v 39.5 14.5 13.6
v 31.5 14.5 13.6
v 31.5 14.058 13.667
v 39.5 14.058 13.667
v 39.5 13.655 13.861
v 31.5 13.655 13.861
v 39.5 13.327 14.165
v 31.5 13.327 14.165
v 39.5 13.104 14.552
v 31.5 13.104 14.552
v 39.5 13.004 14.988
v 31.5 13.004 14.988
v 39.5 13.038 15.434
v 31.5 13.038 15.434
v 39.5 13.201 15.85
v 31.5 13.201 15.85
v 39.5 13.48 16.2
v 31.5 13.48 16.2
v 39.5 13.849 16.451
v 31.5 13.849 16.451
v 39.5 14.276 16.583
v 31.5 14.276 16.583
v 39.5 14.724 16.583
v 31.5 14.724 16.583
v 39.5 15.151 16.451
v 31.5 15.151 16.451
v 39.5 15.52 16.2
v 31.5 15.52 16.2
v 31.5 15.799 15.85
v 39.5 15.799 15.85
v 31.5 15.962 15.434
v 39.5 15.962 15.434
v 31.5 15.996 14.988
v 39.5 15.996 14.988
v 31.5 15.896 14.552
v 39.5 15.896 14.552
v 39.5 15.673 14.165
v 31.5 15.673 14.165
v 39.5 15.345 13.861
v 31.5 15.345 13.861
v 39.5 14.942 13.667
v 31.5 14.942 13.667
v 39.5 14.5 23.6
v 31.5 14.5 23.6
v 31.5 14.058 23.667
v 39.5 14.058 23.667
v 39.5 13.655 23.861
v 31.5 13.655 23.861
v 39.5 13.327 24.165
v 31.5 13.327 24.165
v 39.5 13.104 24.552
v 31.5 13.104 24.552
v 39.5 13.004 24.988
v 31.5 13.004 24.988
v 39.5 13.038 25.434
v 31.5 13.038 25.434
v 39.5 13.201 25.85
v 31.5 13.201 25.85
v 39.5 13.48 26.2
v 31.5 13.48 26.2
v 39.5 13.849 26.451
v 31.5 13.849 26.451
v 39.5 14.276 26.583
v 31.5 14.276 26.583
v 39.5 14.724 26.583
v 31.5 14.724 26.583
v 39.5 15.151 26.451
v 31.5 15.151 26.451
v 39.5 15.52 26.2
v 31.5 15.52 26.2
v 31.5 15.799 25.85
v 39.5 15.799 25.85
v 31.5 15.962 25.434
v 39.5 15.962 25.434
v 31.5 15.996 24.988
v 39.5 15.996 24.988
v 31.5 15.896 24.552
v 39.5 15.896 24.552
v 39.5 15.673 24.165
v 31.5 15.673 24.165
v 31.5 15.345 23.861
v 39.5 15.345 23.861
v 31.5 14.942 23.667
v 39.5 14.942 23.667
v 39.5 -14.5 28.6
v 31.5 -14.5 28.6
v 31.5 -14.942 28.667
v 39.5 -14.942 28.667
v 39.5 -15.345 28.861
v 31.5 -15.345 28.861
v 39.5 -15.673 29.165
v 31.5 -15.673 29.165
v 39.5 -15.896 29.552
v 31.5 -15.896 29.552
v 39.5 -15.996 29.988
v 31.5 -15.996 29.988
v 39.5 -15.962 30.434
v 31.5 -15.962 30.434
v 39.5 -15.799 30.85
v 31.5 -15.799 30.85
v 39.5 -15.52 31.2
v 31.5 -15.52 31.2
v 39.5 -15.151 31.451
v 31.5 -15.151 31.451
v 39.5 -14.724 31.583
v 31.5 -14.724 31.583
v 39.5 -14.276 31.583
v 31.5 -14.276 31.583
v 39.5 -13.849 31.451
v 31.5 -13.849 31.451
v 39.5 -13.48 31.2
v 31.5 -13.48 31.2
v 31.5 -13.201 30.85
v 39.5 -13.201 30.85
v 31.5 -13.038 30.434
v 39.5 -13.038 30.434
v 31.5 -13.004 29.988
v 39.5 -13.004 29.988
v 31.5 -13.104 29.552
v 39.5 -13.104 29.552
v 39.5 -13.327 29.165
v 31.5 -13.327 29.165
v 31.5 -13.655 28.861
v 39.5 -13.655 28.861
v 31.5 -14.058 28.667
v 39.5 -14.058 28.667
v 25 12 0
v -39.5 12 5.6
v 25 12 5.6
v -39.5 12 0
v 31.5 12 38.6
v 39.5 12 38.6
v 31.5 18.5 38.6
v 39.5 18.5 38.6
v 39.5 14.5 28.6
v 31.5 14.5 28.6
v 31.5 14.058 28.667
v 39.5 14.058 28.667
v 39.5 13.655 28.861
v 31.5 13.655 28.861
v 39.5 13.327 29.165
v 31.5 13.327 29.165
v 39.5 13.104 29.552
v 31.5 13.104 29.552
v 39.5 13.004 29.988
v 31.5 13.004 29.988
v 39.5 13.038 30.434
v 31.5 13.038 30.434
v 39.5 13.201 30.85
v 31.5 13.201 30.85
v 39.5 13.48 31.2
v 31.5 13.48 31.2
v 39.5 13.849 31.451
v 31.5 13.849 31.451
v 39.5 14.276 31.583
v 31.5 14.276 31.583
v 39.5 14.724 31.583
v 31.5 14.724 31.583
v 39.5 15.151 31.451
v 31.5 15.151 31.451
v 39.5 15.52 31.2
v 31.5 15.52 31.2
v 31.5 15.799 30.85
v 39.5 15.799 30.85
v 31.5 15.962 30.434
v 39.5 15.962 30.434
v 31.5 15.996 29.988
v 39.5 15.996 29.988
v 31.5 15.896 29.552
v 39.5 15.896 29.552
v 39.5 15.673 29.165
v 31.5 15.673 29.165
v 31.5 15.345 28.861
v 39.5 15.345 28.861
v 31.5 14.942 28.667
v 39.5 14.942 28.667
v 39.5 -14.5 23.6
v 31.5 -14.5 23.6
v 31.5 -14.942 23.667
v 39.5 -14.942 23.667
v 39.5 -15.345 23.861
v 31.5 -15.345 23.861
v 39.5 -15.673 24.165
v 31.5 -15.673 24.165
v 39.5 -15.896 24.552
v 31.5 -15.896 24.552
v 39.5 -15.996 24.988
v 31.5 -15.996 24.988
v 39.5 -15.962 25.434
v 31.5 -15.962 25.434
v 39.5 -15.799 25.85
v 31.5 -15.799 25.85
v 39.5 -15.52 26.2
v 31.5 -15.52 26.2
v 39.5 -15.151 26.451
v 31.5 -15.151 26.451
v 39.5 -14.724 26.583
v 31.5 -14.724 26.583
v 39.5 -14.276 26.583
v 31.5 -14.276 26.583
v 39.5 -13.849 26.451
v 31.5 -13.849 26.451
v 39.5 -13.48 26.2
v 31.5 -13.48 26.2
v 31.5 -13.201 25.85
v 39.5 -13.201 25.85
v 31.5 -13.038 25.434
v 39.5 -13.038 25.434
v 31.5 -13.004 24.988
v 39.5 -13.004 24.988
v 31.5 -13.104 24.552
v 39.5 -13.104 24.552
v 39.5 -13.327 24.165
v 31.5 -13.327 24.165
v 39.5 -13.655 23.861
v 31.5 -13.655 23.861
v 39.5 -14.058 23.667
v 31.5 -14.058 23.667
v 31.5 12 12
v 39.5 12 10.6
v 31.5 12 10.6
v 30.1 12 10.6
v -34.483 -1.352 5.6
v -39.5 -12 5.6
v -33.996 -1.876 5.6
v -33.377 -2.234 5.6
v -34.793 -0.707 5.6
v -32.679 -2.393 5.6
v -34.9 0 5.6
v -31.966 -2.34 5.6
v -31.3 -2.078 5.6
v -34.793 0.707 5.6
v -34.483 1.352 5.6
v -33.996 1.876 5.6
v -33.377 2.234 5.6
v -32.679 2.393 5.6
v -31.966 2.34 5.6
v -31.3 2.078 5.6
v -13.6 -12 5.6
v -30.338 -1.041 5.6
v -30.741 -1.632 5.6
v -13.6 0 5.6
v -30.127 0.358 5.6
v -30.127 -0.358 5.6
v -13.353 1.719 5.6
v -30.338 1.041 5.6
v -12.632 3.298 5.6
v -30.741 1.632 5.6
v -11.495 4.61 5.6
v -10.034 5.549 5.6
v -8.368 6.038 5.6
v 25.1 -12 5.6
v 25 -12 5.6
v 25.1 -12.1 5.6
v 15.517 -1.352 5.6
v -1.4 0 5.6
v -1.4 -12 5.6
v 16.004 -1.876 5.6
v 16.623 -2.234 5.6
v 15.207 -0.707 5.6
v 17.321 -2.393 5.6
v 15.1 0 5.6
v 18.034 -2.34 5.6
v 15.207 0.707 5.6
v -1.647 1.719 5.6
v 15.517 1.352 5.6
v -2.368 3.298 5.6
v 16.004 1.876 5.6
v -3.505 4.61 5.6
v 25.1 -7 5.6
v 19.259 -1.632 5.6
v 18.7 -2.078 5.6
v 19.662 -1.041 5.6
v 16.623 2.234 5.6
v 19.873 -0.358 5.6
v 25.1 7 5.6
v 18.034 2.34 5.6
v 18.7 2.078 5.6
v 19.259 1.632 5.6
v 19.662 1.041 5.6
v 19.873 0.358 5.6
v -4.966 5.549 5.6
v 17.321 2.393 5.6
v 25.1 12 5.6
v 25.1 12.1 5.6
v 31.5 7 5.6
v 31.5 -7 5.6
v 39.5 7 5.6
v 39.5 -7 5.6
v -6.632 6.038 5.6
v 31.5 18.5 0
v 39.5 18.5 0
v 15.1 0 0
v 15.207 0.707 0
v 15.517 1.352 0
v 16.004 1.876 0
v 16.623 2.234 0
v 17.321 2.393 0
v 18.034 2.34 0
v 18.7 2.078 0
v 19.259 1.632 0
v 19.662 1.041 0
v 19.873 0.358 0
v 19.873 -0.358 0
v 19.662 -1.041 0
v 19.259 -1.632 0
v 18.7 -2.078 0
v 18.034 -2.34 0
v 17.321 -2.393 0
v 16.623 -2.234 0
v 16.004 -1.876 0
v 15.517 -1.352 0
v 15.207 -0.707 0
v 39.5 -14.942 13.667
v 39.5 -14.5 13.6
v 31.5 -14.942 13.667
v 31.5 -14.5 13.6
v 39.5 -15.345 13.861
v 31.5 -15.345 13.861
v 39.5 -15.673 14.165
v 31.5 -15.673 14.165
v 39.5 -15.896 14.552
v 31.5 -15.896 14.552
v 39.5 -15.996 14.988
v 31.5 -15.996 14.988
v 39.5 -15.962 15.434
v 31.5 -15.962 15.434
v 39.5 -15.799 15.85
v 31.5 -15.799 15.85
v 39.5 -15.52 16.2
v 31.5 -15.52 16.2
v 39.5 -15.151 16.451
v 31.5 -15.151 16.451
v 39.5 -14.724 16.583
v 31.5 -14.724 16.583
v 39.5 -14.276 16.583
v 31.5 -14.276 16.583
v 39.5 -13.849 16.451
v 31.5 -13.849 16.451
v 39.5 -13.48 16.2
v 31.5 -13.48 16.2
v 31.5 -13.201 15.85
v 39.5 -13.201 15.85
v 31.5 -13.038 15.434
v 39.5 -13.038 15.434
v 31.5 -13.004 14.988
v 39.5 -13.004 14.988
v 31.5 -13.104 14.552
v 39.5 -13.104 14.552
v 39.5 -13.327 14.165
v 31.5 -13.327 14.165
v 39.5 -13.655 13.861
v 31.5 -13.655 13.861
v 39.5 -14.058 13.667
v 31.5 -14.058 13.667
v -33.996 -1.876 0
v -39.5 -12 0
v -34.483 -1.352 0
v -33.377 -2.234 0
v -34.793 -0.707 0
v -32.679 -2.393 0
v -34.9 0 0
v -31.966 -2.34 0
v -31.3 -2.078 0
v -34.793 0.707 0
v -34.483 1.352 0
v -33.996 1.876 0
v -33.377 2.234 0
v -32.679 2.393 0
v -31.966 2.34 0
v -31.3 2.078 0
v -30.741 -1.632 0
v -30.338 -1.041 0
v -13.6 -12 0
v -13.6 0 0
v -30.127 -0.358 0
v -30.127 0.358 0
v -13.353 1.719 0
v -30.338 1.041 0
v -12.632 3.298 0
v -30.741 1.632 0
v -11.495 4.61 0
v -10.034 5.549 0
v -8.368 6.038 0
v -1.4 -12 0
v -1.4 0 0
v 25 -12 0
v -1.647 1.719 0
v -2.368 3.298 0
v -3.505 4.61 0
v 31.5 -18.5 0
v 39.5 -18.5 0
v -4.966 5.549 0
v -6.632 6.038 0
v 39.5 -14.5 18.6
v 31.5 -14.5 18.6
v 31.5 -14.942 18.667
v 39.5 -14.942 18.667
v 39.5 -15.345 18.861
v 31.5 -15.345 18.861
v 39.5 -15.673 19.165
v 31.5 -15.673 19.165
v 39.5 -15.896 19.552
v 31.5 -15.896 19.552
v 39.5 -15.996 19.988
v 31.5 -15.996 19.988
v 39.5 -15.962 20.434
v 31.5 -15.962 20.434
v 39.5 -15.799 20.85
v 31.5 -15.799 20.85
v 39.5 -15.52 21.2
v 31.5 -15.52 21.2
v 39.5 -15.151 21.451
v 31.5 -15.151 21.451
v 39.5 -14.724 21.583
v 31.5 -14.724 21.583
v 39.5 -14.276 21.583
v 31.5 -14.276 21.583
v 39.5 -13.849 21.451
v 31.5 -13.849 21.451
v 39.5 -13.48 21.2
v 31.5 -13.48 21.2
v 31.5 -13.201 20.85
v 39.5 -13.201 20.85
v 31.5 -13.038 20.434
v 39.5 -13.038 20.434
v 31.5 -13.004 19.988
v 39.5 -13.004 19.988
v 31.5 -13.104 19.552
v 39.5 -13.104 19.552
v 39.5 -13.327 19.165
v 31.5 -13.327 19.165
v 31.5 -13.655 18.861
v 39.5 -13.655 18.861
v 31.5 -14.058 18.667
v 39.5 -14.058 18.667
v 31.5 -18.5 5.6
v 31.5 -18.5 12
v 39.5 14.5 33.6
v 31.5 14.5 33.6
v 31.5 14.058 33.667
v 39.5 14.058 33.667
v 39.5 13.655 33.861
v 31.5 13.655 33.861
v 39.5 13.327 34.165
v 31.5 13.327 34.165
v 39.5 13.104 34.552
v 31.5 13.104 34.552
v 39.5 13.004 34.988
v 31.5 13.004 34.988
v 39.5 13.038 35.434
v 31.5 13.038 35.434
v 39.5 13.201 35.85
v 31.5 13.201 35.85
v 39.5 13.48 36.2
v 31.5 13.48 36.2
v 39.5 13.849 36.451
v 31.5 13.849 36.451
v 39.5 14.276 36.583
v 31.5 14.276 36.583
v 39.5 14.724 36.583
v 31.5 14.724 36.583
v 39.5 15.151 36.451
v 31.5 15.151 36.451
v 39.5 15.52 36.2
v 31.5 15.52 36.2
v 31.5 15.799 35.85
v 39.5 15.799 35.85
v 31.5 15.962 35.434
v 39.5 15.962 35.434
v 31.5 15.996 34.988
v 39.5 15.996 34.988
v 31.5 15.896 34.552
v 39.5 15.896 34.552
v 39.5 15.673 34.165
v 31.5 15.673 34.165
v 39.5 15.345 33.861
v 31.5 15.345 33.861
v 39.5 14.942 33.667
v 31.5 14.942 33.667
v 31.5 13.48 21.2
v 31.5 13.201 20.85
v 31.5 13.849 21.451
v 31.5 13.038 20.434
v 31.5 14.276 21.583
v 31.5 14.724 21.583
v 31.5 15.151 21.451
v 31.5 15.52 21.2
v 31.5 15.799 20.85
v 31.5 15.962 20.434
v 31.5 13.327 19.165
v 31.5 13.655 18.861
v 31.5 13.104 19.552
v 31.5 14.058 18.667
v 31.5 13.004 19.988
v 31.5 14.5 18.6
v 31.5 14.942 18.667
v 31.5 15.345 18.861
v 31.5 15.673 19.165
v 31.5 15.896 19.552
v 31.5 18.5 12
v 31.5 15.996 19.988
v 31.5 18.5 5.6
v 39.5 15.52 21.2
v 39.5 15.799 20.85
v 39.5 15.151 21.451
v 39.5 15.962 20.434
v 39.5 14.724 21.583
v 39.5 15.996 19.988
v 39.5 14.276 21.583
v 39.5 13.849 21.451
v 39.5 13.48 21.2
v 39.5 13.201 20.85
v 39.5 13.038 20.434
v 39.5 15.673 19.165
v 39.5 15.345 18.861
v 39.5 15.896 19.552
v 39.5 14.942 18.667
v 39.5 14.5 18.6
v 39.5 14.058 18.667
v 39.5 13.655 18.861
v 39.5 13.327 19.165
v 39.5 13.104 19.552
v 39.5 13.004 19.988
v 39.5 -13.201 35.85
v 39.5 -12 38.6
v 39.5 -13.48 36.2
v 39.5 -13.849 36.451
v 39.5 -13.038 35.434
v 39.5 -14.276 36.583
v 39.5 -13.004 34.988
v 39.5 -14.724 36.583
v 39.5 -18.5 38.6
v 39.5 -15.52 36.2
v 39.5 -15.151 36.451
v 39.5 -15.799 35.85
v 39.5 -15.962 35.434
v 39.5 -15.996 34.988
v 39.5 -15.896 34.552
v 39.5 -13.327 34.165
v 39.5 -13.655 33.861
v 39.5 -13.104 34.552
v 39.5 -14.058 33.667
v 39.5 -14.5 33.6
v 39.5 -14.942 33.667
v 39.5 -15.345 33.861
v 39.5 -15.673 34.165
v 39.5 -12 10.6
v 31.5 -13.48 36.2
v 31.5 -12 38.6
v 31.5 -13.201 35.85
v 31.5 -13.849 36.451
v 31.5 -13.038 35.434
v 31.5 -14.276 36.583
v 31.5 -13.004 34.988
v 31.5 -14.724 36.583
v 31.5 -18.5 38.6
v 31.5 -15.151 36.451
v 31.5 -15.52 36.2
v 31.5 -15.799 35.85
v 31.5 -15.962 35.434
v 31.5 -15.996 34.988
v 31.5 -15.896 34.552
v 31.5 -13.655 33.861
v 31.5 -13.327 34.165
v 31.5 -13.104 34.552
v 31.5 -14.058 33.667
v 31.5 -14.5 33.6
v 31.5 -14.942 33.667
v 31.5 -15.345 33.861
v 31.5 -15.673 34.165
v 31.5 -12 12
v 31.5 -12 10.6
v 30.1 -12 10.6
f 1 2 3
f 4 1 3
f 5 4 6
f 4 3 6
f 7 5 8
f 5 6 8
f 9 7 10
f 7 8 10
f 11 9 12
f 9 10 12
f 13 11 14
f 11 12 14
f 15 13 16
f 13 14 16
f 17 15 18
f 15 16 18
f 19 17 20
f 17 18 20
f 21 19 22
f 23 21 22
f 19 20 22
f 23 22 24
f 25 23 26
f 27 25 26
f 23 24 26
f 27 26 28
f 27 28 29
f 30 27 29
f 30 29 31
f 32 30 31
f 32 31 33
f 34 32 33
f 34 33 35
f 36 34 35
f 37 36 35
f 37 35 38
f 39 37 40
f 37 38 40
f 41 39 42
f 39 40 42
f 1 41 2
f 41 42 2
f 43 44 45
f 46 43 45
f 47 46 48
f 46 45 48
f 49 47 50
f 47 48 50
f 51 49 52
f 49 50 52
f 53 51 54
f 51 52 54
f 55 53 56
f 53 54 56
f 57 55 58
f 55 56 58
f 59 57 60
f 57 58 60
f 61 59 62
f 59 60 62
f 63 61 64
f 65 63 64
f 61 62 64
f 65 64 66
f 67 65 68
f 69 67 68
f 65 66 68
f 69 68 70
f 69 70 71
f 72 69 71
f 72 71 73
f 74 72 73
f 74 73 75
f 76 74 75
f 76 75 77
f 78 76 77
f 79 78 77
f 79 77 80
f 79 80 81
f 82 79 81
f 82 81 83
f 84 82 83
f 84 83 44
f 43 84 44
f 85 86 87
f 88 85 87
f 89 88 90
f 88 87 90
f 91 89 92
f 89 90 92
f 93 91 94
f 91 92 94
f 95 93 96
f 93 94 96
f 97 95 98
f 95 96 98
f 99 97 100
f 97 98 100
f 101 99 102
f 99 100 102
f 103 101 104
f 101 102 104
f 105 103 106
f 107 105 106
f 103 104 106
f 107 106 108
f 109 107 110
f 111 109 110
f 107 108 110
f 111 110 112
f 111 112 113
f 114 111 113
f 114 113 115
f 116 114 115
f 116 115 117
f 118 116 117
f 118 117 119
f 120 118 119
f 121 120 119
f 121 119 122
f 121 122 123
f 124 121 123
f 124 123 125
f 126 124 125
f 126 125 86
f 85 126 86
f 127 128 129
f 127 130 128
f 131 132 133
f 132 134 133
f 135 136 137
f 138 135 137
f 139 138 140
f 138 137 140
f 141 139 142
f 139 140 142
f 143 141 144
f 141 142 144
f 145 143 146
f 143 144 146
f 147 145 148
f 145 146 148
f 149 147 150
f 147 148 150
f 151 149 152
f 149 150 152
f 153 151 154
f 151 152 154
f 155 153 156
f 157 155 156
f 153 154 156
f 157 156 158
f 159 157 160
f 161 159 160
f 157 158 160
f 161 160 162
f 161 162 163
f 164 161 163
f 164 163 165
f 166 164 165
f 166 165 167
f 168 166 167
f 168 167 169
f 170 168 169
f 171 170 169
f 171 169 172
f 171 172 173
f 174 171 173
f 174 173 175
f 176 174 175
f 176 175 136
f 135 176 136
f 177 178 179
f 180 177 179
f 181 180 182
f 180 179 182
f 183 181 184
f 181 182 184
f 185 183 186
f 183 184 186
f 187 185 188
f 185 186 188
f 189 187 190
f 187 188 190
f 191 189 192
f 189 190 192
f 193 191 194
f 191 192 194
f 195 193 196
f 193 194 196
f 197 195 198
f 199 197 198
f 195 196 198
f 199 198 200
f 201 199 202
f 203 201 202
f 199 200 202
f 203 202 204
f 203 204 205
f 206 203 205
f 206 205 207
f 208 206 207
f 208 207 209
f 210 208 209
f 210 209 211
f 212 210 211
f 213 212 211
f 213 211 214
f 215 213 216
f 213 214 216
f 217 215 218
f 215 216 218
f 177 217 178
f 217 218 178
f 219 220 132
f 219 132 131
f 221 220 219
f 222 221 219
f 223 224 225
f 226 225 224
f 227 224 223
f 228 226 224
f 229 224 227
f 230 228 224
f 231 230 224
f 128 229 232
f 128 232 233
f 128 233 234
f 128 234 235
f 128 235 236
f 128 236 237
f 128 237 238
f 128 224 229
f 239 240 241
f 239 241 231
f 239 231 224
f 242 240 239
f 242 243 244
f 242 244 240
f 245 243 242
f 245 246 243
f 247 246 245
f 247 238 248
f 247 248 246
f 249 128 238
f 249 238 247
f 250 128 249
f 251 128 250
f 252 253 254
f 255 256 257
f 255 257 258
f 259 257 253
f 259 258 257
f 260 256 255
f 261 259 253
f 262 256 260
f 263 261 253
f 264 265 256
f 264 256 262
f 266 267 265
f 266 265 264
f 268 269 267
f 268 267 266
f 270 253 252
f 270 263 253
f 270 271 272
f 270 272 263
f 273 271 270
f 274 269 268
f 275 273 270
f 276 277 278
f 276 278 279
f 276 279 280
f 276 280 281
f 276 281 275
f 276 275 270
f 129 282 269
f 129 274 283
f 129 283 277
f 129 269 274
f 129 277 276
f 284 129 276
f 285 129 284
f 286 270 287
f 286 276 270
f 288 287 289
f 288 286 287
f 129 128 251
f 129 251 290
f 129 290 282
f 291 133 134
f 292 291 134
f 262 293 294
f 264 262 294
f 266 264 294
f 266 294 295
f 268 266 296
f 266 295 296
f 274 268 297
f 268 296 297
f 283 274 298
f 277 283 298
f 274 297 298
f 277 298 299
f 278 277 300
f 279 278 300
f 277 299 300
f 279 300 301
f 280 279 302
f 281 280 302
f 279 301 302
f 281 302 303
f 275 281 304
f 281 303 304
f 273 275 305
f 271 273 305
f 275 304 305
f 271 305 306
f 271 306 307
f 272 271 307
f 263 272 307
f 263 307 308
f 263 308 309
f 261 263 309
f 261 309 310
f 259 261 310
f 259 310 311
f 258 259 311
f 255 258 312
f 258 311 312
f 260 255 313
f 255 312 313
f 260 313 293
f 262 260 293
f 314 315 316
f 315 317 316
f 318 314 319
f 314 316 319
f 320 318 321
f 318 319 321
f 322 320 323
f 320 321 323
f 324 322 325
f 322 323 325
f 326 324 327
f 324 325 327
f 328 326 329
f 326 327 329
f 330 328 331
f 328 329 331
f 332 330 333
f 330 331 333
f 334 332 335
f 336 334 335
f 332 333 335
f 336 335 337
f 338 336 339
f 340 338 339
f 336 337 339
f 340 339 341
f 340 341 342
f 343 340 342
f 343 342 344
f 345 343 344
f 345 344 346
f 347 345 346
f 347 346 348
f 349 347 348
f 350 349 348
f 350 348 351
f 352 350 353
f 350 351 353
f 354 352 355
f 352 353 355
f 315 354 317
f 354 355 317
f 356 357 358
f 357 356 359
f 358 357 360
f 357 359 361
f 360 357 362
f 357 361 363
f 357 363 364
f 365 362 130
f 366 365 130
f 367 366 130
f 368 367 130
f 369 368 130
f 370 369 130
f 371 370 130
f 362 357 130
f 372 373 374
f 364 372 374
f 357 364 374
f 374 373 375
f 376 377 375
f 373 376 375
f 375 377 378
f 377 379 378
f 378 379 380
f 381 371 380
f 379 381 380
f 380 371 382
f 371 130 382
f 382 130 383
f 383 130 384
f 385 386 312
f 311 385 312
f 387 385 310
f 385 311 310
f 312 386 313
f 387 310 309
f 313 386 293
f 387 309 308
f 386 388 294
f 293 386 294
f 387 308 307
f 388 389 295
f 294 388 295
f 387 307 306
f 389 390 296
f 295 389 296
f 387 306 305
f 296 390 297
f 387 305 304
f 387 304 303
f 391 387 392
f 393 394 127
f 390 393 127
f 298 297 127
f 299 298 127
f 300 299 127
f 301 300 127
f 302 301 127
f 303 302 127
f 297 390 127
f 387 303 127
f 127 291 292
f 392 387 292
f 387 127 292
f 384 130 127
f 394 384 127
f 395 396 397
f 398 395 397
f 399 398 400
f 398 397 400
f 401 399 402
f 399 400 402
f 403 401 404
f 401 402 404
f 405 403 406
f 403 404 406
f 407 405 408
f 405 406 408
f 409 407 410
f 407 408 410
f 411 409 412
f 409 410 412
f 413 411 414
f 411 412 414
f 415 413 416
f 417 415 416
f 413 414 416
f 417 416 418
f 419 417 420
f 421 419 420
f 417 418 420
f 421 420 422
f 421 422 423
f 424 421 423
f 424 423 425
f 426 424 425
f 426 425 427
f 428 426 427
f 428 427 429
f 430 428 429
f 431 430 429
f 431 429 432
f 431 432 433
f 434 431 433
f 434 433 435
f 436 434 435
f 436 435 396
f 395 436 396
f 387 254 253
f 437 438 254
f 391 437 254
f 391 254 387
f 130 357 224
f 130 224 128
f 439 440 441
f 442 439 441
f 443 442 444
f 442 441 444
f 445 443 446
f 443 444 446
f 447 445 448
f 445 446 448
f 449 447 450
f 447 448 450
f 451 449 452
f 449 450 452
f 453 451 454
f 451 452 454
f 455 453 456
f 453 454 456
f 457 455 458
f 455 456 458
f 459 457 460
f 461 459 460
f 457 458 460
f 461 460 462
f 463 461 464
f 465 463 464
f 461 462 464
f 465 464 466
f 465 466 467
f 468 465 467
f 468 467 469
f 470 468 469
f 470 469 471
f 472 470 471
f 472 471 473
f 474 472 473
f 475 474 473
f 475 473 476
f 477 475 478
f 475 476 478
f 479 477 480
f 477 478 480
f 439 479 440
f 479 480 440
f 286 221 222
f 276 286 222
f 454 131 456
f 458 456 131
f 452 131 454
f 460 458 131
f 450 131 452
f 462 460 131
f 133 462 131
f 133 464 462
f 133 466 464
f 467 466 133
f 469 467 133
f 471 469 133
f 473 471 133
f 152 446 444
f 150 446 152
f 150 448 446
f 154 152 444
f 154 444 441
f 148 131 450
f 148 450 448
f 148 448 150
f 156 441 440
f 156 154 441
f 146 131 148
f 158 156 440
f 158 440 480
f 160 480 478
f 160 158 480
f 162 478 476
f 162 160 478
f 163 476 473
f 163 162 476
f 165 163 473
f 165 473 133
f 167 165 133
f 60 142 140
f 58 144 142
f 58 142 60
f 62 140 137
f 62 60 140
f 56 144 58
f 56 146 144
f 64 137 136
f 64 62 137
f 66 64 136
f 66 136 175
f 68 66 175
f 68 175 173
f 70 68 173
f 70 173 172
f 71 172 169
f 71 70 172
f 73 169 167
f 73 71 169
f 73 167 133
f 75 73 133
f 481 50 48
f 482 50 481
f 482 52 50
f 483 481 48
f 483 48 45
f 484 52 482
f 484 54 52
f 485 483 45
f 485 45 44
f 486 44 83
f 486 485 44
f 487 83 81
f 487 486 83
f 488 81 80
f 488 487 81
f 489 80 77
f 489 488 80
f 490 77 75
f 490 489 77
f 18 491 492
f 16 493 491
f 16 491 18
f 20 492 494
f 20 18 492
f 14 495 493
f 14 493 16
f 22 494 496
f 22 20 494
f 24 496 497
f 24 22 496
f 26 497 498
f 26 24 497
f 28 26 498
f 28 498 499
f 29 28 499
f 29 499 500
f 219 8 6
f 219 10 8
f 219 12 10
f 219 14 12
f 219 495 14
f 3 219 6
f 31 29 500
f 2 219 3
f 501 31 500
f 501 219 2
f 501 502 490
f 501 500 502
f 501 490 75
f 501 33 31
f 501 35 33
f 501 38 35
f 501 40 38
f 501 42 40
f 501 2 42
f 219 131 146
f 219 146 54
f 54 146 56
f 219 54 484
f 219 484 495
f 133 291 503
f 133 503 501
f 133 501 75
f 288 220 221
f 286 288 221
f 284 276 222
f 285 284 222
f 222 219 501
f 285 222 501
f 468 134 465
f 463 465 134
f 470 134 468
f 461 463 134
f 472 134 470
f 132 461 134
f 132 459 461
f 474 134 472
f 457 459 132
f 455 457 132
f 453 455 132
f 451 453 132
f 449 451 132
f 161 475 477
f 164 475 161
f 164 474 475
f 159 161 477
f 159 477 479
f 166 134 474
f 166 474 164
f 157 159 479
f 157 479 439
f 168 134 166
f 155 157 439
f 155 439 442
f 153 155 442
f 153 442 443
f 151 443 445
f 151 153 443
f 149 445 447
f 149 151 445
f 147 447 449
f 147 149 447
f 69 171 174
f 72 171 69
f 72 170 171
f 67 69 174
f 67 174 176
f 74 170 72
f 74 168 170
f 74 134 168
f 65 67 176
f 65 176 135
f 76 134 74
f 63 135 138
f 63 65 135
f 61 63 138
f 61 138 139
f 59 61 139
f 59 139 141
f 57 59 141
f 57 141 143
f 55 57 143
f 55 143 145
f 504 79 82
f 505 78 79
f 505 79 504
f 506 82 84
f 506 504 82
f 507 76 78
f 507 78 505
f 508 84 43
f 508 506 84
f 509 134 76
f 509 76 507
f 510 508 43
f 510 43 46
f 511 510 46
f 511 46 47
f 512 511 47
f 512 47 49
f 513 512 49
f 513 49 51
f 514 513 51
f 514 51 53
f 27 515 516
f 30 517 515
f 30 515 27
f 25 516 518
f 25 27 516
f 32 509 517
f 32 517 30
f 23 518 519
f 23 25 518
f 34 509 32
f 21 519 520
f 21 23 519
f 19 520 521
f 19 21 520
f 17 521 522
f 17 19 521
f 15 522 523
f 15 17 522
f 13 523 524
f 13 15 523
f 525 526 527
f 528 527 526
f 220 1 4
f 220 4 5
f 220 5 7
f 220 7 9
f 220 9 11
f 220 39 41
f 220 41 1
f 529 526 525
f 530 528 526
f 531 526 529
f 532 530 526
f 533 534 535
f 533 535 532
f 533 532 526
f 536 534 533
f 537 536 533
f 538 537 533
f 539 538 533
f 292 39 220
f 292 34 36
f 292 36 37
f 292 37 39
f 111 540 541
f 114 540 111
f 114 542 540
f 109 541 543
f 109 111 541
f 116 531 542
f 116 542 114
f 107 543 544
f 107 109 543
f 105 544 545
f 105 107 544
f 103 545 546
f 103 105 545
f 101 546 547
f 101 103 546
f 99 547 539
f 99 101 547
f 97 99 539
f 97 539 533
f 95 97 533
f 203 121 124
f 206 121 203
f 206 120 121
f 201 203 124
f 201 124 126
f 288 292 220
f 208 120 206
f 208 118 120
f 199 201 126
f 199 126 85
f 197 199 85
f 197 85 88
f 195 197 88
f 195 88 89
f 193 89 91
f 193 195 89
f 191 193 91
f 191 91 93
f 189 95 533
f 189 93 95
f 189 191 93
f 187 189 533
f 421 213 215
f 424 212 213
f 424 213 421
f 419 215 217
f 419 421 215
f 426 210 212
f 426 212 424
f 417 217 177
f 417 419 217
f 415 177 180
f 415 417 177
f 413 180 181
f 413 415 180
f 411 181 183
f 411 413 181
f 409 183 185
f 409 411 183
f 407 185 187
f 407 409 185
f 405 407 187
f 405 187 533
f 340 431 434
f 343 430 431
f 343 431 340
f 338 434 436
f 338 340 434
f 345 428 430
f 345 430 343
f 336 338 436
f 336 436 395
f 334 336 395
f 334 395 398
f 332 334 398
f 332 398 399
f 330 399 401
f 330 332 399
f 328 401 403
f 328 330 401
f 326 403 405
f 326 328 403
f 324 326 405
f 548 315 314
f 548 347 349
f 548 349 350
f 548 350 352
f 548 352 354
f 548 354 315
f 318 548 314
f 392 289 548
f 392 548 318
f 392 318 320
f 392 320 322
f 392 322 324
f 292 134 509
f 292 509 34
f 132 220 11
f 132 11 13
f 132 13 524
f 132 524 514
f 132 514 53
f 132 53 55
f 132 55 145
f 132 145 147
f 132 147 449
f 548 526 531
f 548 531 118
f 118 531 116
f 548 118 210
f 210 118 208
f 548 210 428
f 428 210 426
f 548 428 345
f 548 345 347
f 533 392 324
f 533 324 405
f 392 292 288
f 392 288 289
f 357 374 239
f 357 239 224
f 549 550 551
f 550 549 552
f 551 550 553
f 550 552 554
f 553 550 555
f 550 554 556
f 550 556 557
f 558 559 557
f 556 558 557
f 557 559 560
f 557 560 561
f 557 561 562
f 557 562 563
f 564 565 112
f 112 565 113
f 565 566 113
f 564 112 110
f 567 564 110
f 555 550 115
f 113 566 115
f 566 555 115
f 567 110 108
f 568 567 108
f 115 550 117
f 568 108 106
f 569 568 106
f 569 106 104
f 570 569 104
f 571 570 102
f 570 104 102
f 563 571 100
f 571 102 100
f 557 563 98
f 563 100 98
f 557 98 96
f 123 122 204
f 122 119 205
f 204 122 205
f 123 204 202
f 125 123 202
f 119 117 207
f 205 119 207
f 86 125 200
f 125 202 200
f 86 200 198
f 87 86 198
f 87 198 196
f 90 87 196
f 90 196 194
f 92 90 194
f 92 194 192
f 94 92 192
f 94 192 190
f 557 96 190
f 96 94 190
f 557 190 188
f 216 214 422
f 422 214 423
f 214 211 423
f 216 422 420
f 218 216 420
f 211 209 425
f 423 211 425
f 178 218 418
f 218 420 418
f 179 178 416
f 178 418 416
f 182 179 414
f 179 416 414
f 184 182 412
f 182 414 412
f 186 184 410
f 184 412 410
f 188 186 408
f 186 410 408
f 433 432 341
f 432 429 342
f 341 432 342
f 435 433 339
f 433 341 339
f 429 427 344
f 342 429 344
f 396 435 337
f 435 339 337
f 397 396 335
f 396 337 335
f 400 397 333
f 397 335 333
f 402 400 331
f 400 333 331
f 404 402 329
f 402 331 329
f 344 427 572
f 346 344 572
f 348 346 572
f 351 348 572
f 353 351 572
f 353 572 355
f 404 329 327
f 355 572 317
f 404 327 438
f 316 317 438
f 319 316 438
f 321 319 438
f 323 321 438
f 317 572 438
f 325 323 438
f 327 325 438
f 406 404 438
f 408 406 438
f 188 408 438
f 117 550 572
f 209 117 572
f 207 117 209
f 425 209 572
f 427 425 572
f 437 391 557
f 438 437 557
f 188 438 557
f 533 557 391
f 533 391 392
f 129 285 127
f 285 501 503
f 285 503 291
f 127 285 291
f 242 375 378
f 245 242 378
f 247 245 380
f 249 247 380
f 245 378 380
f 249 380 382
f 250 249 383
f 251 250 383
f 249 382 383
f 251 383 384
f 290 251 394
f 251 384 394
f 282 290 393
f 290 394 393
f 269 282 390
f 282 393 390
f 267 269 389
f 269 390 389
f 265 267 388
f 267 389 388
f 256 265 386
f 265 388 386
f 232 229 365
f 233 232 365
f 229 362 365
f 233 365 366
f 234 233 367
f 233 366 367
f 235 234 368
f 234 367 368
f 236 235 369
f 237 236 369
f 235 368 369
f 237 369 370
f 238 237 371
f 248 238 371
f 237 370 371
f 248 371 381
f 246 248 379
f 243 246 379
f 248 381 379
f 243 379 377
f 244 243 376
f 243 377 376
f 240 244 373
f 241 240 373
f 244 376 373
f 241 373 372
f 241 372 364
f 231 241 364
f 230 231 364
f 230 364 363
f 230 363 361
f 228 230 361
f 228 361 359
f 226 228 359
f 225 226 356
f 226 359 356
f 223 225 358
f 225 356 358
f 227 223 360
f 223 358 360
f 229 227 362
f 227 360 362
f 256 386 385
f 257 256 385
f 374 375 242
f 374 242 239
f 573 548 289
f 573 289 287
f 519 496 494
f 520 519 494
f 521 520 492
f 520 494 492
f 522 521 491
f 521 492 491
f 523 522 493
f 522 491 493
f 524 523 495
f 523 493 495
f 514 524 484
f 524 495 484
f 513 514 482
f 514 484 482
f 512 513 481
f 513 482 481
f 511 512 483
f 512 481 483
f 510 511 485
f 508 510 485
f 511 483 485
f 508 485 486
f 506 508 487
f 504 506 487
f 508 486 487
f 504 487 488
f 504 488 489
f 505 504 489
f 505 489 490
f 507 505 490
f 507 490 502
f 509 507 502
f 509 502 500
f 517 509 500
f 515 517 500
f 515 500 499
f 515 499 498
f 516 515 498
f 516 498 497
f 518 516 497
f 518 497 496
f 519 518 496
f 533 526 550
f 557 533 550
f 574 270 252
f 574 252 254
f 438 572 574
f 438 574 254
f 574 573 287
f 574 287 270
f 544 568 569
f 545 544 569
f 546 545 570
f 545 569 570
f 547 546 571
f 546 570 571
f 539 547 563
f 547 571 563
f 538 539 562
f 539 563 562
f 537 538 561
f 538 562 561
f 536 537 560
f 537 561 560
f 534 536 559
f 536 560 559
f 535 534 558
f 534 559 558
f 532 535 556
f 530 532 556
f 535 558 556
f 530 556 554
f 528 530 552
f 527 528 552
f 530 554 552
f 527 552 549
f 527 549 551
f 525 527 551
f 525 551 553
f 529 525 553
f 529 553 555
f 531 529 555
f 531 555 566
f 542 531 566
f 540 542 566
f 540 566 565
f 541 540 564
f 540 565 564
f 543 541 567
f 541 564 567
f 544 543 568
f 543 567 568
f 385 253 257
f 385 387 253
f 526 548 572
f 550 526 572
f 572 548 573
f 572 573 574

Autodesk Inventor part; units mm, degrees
ref_plane "YZ Plane" through (0, 0, 0) normal (1, 0, 0) x (0, 1, 0)
ref_plane "XZ Plane" through (0, 0, 0) normal (0, 1, 0) x (-1, 0, 0)
ref_plane "XY Plane" through (0, 0, 0) normal (0, 0, 1) x (1, 0, 0)
sketch "Sketch1" plane through (0, 0, 0) normal (0, 0, 1) x (1, 0, 0)
  line L0 (-39.5, 12) -> (39.5, 12)
  line L1 (39.5, 12) -> (39.5, -12)
  line L2 (39.5, -12) -> (-39.5, -12)
  line L3 (-39.5, -12) -> (-39.5, 12)
  line L4 (-39.5, 12) -> (39.5, -12) construction
  line L5 (39.5, 12) -> (-39.5, -12) construction
  point P0 (0, 0)
  dimension "d0" = 79
  dimension "d1" = 24
extrude "Extrusion1" add sketch "Sketch1" along normal blind 5.6
sketch "Sketch3" plane through (0, 0, 0) normal (0, 0, -1) x (-1, 0, 0)
  line L0 (-39.5, 12) -> (-31.5, 12)
  line L1 (-31.5, 12) -> (-31.5, 18.5)
  line L2 (-31.5, 18.5) -> (-39.5, 18.5)
  line L3 (-39.5, 18.5) -> (-39.5, 12)
  line L4 (-39.5, -12) -> (-31.5, -12)
  line L5 (-31.5, -12) -> (-31.5, -18.5)
  line L6 (-31.5, -18.5) -> (-39.5, -18.5)
  line L7 (-39.5, -18.5) -> (-39.5, -12)
  point P0 (0, 0)
  dimension "d8" = 8
  dimension "d9" = 6.5
  dimension "d10" = 6.5
extrude "Extrusion2" add sketch "Sketch3" against normal blind 38.6
chamfer "Chamfer1" distance 6.5 angle 45 2 edges at (31.5, -12, 2.8) (31.5, 12, 2.8)
sketch "Sketch5" plane through (0, 0, 0) normal (0, 0, -1) x (-1, 0, 0)
  line L0 (-25, -12) -> (39.5, -12) projected
  line L1 (39.5, 12) -> (-24.5, 12) construction
  line L2 (-24.5, 12) -> (-24.5, -12) construction
  line L3 (-24.5, -12) -> (39.5, -12) construction
  line L4 (39.5, -12) -> (39.5, 12) construction
  line L5 (-24.5, 12) -> (39.5, -12) construction
  line L6 (39.5, 12) -> (-24.5, -12) construction
  circle A0 centre (7.5, 0) radius 6.1
  line L7 (-17.5, 3) -> (32.5, 3) construction
  line L8 (32.5, 3) -> (32.5, -3) construction
  line L9 (32.5, -3) -> (-17.5, -3) construction
  line L10 (-17.5, -3) -> (-17.5, 3) construction
  line L11 (-17.5, 3) -> (32.5, -3) construction
  line L12 (32.5, 3) -> (-17.5, -3) construction
  circle A1 centre (-17.5, 0) radius 2.4
  circle A2 centre (32.5, 0) radius 2.4
  line L13 (1.4, 0) -> (1.4, -12)
  line L14 (13.6, 0) -> (13.6, -12)
  line L15 (13.6, -12) -> (1.4, -12)
  point P0 (0, 0)
  dimension "d29" = 64
  dimension "d30" = 12.2
  dimension "d31" = 50
  dimension "d32" = 4.8
  dimension "d33" = 4.8
extrude "Extrusion4" cut sketch "Sketch5" against normal blind 5.6
sketch "Sketch6" plane through (39.5, -18.5, 0) normal (1, 0, 0) x (0, 0, -1)
  line L0 (-38.6, 6.5) -> (-5.6, 6.5) construction
  line L1 (-5.6, 6.5) -> (-5.6, 1.5) construction
  line L2 (-5.6, 1.5) -> (-38.6, 1.5) construction
  line L3 (-38.6, 1.5) -> (-38.6, 6.5) construction
  line L4 (-38.6, 30.5) -> (-5.6, 30.5) construction
  line L5 (-5.6, 30.5) -> (-5.6, 35.5) construction
  line L6 (-5.6, 35.5) -> (-38.6, 35.5) construction
  line L7 (-38.6, 35.5) -> (-38.6, 30.5) construction
  line L8 (-38.6, 4) -> (-5.6, 4) construction
  line L9 (-38.6, 33) -> (-5.6, 33) construction
  line L10 (-38.6, 1.5) -> (-37.6, 1.5) construction
  line L11 (-37.6, 1.5) -> (-37.6, 6.5) construction
  line L12 (-37.6, 6.5) -> (-38.6, 6.5) construction
  line L13 (-38.6, 6.5) -> (-38.6, 1.5) construction
  line L14 (-37.6, 1.5) -> (-32.6, 1.5) construction
  line L15 (-32.6, 1.5) -> (-32.6, 6.5) construction
  line L16 (-32.6, 6.5) -> (-37.6, 6.5) construction
  line L17 (-37.6, 6.5) -> (-37.6, 1.5) construction
  line L18 (-38.6, 30.5) -> (-37.6, 30.5) construction
  line L19 (-37.6, 30.5) -> (-37.6, 35.5) construction
  line L20 (-37.6, 35.5) -> (-38.6, 35.5) construction
  line L21 (-38.6, 35.5) -> (-38.6, 30.5) construction
  line L22 (-37.6, 30.5) -> (-32.6, 30.5) construction
  line L23 (-32.6, 30.5) -> (-32.6, 35.5) construction
  line L24 (-32.6, 35.5) -> (-37.6, 35.5) construction
  line L25 (-37.6, 35.5) -> (-37.6, 30.5) construction
  line L26 (-37.6, 1.5) -> (-32.6, 6.5) construction
  line L27 (-37.6, 6.5) -> (-32.6, 1.5) construction
  line L28 (-37.6, 30.5) -> (-32.6, 35.5) construction
  line L29 (-37.6, 35.5) -> (-32.6, 30.5) construction
  line L30 (-38.6, 35.5) -> (-37.6, 35.5) construction
  line L31 (-37.6, 35.5) -> (-37.6, 30.5) construction
  line L32 (-37.6, 30.5) -> (-38.6, 30.5) construction
  line L33 (-38.6, 30.5) -> (-38.6, 35.5) construction
  line L34 (-5.6, 30.5) -> (-38.6, 30.5) projected
  line L35 (-32.6, 35.5) -> (-27.6, 35.5) construction
  line L36 (-27.6, 35.5) -> (-27.6, 30.5) construction
  line L37 (-27.6, 30.5) -> (-32.6, 30.5) construction
  line L38 (-32.6, 30.5) -> (-32.6, 35.5) construction
  line L39 (-27.6, 35.5) -> (-22.6, 35.5) construction
  line L40 (-22.6, 35.5) -> (-22.6, 30.5) construction
  line L41 (-22.6, 30.5) -> (-27.6, 30.5) construction
  line L42 (-27.6, 30.5) -> (-27.6, 35.5) construction
  line L43 (-32.6, 6.5) -> (-27.6, 6.5) construction
  line L44 (-27.6, 6.5) -> (-27.6, 1.5) construction
  line L45 (-27.6, 1.5) -> (-32.6, 1.5) construction
  line L46 (-32.6, 1.5) -> (-32.6, 6.5) construction
  line L47 (-27.6, 6.5) -> (-22.6, 6.5) construction
  line L48 (-22.6, 6.5) -> (-22.6, 1.5) construction
  line L49 (-22.6, 1.5) -> (-27.6, 1.5) construction
  line L50 (-27.6, 1.5) -> (-27.6, 6.5) construction
  line L51 (-22.6, 35.5) -> (-17.6, 35.5) construction
  line L52 (-17.6, 35.5) -> (-17.6, 30.5) construction
  line L53 (-17.6, 30.5) -> (-22.6, 30.5) construction
  line L54 (-22.6, 30.5) -> (-22.6, 35.5) construction
  line L55 (-22.6, 6.5) -> (-17.6, 6.5) construction
  line L56 (-17.6, 6.5) -> (-17.6, 1.5) construction
  line L57 (-17.6, 1.5) -> (-22.6, 1.5) construction
  line L58 (-22.6, 1.5) -> (-22.6, 6.5) construction
  line L59 (-17.6, 35.5) -> (-12.6, 35.5) construction
  line L60 (-12.6, 35.5) -> (-12.6, 30.5) construction
  line L61 (-12.6, 30.5) -> (-17.6, 30.5) construction
  line L62 (-17.6, 30.5) -> (-17.6, 35.5) construction
  line L63 (-17.6, 6.5) -> (-12.6, 6.5) construction
  line L64 (-12.6, 6.5) -> (-12.6, 1.5) construction
  line L65 (-12.6, 1.5) -> (-17.6, 1.5) construction
  line L66 (-17.6, 1.5) -> (-17.6, 6.5) construction
  line L67 (-32.6, 35.5) -> (-27.6, 30.5) construction
  line L68 (-27.6, 35.5) -> (-32.6, 30.5) construction
  line L69 (-27.6, 35.5) -> (-22.6, 30.5) construction
  line L70 (-27.6, 30.5) -> (-22.6, 35.5) construction
  line L71 (-22.6, 30.5) -> (-17.6, 35.5) construction
  line L72 (-22.6, 35.5) -> (-17.6, 30.5) construction
  line L73 (-17.6, 35.5) -> (-12.6, 30.5) construction
  line L74 (-12.6, 35.5) -> (-17.6, 30.5) construction
  line L75 (-17.6, 6.5) -> (-12.6, 1.5) construction
  line L76 (-12.6, 6.5) -> (-17.6, 1.5) construction
  line L77 (-22.6, 6.5) -> (-17.6, 1.5) construction
  line L78 (-17.6, 6.5) -> (-22.6, 1.5) construction
  line L79 (-27.6, 6.5) -> (-22.6, 1.5) construction
  line L80 (-22.6, 6.5) -> (-27.6, 1.5) construction
  line L81 (-32.6, 6.5) -> (-27.6, 1.5) construction
  line L82 (-27.6, 6.5) -> (-32.6, 1.5) construction
  point P0 (0, 18.5)
  point P1 (-35.1, 4)
  point P2 (-35.1, 33)
  point P3 (-30.1, 33)
  point P4 (-25.1, 33)
  point P5 (-20.1, 33)
  point P6 (-15.1, 33)
  point P7 (-15.1, 4)
  point P8 (-20.1, 4)
  point P9 (-25.1, 4)
  point P10 (-30.1, 4)
  dimension "d42" = 5
  dimension "d43" = 5
  dimension "d44" = 1
  dimension "d45" = 5
  dimension "d46" = 5
  dimension "d54" = 33
  dimension "d55" = 1
  dimension "d59" = 5
  dimension "d60" = 5
  dimension "d61" = 5
  dimension "d62" = 5
hole "Hole2" at (39.5, -14.5, 35.1) at (39.5, 14.5, 35.1) at (39.5, 14.5, 30.1) at (39.5, 14.5, 25.1) at (39.5, 14.5, 20.1) at (39.5, 14.5, 15.1) at (39.5, -14.5, 15.1) at (39.5, -14.5, 20.1) at (39.5, -14.5, 25.1) at (39.5, -14.5, 30.1) direction (-1, 0, 0) diameter 3 end through all
chamfer "Chamfer2" distance 6.4 angle 45 2 edges at (31.5, 15.25, 5.6) (31.5, -15.25, 5.6)
chamfer "Chamfer3" distance 5 angle 45 2 edges at (35.5, 12, 5.6) (35.5, -12, 5.6)
properties part number "Servo-Groove-Mount-E3D"
